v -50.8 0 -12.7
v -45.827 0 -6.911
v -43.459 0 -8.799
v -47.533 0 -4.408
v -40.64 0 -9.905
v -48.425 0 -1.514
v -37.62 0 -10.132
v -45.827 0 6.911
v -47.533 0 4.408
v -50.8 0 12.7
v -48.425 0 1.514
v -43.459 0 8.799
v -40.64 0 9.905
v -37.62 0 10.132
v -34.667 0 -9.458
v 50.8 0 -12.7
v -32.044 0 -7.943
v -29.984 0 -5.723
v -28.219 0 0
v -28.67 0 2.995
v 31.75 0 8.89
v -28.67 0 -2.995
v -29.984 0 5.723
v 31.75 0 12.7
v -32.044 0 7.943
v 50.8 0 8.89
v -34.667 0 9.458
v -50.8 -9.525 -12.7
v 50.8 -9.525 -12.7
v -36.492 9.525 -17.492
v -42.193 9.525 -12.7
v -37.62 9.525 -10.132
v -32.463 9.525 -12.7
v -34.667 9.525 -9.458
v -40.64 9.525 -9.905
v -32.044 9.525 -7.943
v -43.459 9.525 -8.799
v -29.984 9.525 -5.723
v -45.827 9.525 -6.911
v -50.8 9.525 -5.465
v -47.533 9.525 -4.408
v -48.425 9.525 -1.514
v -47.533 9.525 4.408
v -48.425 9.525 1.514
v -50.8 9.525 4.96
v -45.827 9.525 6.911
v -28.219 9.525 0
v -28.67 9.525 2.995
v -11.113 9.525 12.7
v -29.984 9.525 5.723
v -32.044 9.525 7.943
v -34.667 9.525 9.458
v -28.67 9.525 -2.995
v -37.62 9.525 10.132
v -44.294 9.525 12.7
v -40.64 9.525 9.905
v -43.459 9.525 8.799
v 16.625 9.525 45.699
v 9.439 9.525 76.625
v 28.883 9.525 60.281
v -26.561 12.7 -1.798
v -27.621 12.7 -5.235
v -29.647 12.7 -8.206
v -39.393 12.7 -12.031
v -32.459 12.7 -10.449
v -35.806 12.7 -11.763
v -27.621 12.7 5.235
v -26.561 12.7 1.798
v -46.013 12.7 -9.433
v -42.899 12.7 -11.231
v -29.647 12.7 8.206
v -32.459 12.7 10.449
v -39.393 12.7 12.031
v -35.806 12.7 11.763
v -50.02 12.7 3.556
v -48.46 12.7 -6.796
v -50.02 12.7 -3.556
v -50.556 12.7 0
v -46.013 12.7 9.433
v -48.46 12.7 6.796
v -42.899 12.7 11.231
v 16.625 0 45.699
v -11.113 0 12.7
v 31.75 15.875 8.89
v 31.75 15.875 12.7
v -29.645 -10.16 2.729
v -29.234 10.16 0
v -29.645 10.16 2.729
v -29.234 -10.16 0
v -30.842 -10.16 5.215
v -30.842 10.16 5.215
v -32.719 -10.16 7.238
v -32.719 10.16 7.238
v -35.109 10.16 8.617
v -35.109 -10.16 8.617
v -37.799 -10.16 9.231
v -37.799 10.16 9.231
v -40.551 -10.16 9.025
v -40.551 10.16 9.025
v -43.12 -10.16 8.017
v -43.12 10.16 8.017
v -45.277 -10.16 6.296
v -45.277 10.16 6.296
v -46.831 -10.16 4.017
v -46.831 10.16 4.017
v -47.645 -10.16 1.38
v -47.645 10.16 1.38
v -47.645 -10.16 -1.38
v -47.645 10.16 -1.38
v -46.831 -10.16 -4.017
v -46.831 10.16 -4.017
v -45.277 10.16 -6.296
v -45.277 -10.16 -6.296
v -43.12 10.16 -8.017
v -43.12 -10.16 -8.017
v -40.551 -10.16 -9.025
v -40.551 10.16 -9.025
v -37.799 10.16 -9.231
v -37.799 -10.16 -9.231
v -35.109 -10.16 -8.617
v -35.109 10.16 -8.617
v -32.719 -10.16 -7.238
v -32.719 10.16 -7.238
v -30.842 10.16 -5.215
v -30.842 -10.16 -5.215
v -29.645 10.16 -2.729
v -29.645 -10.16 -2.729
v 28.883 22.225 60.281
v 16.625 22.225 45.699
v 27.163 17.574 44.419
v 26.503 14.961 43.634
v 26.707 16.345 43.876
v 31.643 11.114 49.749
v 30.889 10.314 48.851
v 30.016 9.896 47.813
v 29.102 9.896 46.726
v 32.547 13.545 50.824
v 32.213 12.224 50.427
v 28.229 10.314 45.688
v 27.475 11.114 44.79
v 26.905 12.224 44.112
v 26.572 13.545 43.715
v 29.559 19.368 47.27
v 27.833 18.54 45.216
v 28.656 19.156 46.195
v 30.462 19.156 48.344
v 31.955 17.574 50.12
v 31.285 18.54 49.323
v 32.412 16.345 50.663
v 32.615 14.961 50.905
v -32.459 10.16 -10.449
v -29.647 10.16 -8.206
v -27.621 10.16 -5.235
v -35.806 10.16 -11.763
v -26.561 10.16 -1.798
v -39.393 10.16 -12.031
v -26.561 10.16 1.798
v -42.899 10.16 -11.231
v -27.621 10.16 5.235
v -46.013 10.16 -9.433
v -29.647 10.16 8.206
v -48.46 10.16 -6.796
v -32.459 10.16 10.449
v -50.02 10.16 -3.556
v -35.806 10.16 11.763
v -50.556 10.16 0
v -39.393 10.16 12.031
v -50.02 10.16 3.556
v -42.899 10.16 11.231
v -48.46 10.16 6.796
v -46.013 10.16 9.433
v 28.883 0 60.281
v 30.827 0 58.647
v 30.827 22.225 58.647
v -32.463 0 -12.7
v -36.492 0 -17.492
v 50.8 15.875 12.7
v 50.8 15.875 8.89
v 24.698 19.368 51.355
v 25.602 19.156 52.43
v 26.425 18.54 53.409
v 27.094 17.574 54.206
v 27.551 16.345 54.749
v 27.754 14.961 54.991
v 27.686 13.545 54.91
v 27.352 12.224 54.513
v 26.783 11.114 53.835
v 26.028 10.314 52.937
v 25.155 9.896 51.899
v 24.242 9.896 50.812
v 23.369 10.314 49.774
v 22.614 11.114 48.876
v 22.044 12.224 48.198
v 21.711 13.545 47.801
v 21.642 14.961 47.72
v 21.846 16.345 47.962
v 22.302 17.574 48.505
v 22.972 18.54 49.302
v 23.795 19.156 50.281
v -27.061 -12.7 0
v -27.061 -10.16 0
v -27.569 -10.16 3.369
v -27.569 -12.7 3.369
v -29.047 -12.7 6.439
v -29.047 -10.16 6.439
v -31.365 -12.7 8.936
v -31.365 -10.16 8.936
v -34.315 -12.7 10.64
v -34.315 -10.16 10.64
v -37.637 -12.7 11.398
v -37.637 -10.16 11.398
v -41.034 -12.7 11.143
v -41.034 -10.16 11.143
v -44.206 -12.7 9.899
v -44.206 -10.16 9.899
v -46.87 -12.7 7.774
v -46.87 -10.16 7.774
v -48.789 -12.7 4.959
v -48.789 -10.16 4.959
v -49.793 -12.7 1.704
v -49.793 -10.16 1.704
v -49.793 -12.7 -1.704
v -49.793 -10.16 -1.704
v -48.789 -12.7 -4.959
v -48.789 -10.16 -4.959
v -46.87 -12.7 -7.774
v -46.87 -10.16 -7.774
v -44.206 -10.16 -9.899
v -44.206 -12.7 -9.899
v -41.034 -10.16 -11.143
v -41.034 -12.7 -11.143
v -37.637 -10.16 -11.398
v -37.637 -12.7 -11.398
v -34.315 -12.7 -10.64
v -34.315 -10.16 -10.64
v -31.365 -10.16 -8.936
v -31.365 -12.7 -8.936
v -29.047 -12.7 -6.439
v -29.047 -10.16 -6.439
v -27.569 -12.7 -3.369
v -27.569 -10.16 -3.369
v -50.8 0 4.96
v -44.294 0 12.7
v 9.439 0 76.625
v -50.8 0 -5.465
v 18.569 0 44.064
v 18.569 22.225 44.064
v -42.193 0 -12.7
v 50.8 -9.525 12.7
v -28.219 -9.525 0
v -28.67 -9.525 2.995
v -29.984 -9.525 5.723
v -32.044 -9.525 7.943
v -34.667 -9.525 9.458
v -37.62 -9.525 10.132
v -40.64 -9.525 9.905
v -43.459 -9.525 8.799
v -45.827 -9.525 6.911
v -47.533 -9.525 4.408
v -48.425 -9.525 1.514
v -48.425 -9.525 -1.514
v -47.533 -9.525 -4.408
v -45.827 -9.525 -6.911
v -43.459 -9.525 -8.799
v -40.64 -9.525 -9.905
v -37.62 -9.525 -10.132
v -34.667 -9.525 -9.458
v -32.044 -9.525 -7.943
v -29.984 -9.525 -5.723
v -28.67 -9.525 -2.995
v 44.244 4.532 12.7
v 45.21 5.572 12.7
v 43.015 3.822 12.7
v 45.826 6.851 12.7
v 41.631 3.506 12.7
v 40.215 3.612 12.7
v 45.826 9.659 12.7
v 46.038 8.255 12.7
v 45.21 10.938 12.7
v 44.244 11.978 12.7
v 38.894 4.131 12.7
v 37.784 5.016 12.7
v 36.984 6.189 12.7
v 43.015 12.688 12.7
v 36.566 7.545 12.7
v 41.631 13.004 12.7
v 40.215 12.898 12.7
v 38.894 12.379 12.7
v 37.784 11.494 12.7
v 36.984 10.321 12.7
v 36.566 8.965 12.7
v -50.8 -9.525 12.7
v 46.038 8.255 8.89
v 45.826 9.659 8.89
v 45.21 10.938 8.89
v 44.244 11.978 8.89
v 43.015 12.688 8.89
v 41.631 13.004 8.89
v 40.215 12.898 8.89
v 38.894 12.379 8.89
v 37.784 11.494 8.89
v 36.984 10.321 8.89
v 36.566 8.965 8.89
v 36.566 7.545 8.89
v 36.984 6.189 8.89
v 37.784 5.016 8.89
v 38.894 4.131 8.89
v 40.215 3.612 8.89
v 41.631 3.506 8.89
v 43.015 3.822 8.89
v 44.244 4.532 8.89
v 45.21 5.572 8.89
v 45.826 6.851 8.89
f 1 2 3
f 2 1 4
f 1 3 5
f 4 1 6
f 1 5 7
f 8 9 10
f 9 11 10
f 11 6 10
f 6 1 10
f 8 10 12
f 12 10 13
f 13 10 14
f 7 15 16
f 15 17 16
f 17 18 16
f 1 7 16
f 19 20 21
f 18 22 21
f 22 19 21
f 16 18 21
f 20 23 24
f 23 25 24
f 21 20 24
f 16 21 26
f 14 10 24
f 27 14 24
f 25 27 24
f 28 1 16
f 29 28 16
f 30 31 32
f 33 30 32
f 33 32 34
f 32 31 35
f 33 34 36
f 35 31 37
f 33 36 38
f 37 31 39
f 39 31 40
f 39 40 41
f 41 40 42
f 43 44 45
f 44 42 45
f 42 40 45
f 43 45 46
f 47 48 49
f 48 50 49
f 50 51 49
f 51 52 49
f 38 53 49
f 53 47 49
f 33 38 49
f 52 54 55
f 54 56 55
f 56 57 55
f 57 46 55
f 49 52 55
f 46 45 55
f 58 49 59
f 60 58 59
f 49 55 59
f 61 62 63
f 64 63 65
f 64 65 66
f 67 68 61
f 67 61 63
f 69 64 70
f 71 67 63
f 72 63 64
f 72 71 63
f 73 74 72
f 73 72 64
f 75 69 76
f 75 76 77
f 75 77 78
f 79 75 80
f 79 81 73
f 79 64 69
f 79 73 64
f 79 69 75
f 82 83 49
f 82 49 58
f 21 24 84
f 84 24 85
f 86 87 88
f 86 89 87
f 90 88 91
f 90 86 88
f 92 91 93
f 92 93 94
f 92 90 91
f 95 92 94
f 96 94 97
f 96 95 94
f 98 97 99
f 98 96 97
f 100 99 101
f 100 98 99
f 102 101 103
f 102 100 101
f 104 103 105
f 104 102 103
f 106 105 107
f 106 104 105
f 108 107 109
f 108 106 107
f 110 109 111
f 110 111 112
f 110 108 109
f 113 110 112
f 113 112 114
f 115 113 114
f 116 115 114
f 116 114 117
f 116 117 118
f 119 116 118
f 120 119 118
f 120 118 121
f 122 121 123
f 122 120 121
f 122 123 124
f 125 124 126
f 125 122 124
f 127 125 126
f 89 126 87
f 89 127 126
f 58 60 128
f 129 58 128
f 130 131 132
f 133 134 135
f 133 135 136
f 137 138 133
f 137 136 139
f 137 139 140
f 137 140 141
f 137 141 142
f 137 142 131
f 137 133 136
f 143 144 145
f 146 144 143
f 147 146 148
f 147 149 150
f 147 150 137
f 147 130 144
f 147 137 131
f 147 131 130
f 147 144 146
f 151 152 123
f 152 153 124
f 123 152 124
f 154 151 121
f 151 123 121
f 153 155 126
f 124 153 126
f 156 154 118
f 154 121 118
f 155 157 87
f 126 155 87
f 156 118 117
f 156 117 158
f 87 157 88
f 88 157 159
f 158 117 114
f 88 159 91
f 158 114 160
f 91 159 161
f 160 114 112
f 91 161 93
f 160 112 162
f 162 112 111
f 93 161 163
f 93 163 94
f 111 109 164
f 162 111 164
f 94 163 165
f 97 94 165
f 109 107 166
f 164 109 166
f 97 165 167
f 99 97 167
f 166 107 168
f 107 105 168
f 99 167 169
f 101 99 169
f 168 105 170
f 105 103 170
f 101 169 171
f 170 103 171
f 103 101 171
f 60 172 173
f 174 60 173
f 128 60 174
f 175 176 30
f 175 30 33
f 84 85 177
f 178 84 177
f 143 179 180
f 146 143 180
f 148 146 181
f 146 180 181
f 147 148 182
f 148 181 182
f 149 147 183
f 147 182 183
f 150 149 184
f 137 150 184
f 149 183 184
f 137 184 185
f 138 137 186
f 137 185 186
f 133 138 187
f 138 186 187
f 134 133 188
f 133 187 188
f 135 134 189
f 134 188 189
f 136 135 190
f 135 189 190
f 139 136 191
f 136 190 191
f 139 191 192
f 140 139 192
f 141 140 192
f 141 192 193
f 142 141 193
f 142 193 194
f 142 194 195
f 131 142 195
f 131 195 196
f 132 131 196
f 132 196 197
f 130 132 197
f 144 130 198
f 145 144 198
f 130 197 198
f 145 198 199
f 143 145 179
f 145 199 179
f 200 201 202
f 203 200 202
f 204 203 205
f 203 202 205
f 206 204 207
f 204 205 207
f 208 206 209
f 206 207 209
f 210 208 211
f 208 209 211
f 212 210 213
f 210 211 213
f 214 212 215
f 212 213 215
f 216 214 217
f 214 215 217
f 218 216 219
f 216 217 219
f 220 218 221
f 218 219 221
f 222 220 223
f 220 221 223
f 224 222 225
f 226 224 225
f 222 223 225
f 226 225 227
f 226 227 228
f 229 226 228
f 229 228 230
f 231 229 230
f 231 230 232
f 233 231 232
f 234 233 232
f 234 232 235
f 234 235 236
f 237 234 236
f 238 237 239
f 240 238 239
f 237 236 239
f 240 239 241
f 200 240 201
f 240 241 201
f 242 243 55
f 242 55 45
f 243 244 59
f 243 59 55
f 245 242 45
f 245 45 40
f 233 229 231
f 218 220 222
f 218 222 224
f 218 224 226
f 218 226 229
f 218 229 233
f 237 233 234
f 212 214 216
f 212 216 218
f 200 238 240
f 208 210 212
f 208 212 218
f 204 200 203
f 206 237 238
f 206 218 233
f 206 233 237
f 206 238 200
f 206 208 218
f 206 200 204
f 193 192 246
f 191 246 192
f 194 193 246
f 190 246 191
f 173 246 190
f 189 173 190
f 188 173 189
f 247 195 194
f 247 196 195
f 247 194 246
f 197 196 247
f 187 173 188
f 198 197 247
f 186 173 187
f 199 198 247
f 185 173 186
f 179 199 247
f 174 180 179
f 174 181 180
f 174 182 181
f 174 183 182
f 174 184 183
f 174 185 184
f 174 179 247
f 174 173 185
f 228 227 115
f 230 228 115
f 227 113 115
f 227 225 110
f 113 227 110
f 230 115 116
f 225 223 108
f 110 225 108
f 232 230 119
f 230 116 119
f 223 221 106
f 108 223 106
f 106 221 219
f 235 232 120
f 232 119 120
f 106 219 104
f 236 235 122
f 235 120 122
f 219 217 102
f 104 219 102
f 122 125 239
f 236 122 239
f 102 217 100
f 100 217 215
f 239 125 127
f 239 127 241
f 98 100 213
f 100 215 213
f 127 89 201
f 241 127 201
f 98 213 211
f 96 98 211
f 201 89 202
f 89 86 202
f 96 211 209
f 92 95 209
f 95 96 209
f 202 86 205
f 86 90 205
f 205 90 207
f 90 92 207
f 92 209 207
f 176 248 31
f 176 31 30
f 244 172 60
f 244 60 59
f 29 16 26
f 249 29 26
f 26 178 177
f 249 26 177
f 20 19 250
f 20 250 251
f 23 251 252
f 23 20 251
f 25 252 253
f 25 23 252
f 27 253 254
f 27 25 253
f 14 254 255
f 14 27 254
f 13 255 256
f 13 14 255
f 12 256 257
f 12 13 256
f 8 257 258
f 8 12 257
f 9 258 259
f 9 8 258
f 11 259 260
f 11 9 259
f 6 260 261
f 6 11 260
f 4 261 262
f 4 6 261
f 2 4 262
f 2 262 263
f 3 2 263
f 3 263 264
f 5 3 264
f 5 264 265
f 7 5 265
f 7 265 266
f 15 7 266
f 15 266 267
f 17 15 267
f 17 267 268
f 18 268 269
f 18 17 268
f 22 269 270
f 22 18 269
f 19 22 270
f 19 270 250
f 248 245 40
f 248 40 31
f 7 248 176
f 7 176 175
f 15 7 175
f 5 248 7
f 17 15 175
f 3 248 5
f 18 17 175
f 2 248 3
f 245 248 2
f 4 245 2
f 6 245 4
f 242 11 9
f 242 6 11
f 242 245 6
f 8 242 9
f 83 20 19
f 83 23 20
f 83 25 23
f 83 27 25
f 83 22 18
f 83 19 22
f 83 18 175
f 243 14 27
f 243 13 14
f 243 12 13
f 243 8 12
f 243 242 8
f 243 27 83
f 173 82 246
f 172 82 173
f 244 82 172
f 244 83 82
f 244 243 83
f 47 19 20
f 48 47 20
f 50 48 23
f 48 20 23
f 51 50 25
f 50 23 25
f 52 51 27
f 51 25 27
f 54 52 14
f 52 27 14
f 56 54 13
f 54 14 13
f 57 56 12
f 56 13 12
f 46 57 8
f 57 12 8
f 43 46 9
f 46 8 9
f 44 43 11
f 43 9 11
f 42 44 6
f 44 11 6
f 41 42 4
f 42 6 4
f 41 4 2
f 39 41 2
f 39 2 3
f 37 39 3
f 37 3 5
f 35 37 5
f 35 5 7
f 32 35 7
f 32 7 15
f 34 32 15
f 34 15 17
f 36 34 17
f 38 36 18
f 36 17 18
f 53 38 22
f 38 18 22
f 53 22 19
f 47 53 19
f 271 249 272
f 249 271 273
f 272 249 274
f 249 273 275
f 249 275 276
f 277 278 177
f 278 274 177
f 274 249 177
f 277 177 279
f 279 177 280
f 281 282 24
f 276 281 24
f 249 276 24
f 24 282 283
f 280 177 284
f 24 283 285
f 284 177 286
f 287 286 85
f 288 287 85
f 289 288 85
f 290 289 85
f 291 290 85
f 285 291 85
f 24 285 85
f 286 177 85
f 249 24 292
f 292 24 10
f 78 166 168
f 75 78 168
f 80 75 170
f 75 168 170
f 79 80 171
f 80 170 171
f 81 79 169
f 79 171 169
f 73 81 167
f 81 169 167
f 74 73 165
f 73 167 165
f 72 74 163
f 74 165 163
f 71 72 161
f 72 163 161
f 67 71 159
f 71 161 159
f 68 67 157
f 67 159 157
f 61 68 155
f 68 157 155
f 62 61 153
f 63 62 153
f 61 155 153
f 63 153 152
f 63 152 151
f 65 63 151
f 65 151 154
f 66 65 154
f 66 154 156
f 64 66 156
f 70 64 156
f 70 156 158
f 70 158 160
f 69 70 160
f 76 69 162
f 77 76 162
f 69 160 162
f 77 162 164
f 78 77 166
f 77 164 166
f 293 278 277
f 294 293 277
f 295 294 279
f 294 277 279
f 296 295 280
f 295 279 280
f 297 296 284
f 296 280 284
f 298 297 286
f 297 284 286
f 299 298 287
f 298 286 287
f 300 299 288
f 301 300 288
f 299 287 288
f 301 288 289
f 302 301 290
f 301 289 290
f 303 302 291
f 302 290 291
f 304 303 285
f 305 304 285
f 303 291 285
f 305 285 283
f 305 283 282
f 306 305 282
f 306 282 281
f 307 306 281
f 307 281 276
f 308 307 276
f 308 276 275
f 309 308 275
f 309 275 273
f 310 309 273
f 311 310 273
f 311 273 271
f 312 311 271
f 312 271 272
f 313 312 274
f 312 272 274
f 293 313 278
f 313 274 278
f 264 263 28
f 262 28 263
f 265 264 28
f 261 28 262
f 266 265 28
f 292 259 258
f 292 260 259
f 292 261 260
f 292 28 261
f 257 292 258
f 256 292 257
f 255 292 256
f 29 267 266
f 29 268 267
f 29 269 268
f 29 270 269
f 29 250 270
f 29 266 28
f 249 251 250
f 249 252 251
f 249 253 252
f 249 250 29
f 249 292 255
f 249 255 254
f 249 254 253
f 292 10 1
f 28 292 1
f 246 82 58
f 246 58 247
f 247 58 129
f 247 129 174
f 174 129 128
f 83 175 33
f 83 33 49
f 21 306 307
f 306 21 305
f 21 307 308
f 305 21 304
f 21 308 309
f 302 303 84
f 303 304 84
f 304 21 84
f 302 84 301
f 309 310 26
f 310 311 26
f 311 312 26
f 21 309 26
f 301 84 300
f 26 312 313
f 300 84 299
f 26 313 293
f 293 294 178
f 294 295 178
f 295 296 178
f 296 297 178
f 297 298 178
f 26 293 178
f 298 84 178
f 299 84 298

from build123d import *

# Parameters (mm, degrees)
F0_R      = 10.16
F0_R_2    = 3.4275830425
F1_DEPTH  = 9.525
F2_DEPTH  = 9.525
F3_W      = 19.05
F3_H      = 25.4
F3_R      = 4.7625
F4_DEPTH  = 3.81
F5_R      = 9.2571117711
F6_DEPTH  = 10.16
F7_R      = 12.065
F8_DEPTH  = 2.54
F9_R      = 11.43
F10_DEPTH = 2.54
F11_W     = 9.525
F11_H     = 19.05
F12_DEPTH = 2.54
F11_W_2   = 22.225
F13_DEPTH = 2.54
F14_R     = 4.7625
F15_DEPTH = 6.35


with BuildPart() as f1:
    # F0 (on Front) → F1 (new body)
    with BuildSketch(Plane.XZ):
        Polygon((-36.4917633121, -17.4924569223), (-32.4633427136, -12.7), (-42.1931648392, -12.7), align=None)
        Polygon((-11.1127317723, 12.7), (-44.2941812218, 12.7), (-50.8, 4.9602778243), (-50.8, -5.4653075214), (-42.1931648392, -12.7), (-32.4633427136, -12.7), align=None)
        with Locations((-38.3787619677, 0)):
            Circle(F0_R, mode=Mode.SUBTRACT)
        Polygon((9.4393848725, 76.6247552466), (-44.2941812218, 12.7), (-11.1127317723, 12.7), (28.882779019, 60.2811196639), align=None)
        with Locations((9.803067641, 68.4529374553)):
            Circle(F0_R_2, mode=Mode.SUBTRACT)
        with Locations((9.803067641, 68.4529374553)):
            Circle(F0_R_2)
    extrude(amount=-F1_DEPTH)

    # F11 (on face) → F12 (join)
    with BuildSketch(Plane(origin=(-12.7671757208, 0, 10.7317717179), x_dir=(0, 1, 0), z_dir=(0.7654879585, 0, -0.6434502198))):
        with Locations((4.7625, 55.2041017372)):
            Rectangle(F11_W, F11_H)
    extrude(amount=F12_DEPTH)

    # F11 (on face) → F13 (join)
    with BuildSketch(Plane(origin=(-12.7671757208, 0, 10.7317717179), x_dir=(0, 1, 0), z_dir=(0.7654879585, 0, -0.6434502198))):
        with Locations((11.1125, 55.2041017372)):
            Rectangle(F11_W_2, F11_H)
    extrude(amount=F13_DEPTH)

    # F14 (on face) → F15 (join)
    with BuildSketch(Plane(origin=(-10.8228363062, 0, 9.0974081597), x_dir=(0, 1, 0), z_dir=(0.7654879585, 0, -0.6434502198))):
        with Locations((14.605, 55.2041017372)):
            Circle(F14_R)
    extrude(amount=F15_DEPTH)


with BuildPart() as f2:
    # F0 (on Front) → F2 (new body)
    with BuildSketch(Plane.XZ):
        Polygon((50.8, 12.7), (-11.1127317723, 12.7), (-32.4633427136, -12.7), (50.8, -12.7), align=None)
        Polygon((-11.1127317723, 12.7), (-44.2941812218, 12.7), (-50.8, 4.9602778243), (-50.8, -5.4653075214), (-42.1931648392, -12.7), (-32.4633427136, -12.7), align=None)
        with Locations((-38.3787619677, 0)):
            Circle(F0_R, mode=Mode.SUBTRACT)
        Polygon((-44.2941812218, 12.7), (-50.8, 12.7), (-50.8, 4.9602778243), align=None)
        Polygon((-42.1931648392, -12.7), (-50.8, -5.4653075214), (-50.8, -12.7), align=None)
    extrude(amount=F2_DEPTH)

    # F3 (on face) → F4 (join)
    with BuildSketch(Plane.XY.offset(12.7)):
        with Locations((41.275, 3.175)):
            Rectangle(F3_W, F3_H)
        with Locations((41.275, 8.255)):
            Circle(F3_R, mode=Mode.SUBTRACT)
    extrude(amount=-F4_DEPTH)


with BuildPart() as f6:
    # F5 (on Front) → F6 (new body, symmetric)
    with BuildSketch(Plane.XZ):
        with Locations((-38.4910330176, 0)):
            Circle(F5_R)
    extrude(amount=F6_DEPTH, both=True)

    # F7 (on face) → F8 (join)
    with BuildSketch(Plane(origin=(0, 10.16, 0), x_dir=(-1, 0, 0), z_dir=(0, 1, 0))):
        with Locations((38.4910330176, 0)):
            Circle(F7_R)
    extrude(amount=F8_DEPTH)

    # F9 (on face) → F10 (join)
    with BuildSketch(Plane.XZ.offset(10.16)):
        with Locations((-38.4910330176, 0)):
            Circle(F9_R)
    extrude(amount=F10_DEPTH)


solid = Compound([f1.part, f2.part, f6.part])
